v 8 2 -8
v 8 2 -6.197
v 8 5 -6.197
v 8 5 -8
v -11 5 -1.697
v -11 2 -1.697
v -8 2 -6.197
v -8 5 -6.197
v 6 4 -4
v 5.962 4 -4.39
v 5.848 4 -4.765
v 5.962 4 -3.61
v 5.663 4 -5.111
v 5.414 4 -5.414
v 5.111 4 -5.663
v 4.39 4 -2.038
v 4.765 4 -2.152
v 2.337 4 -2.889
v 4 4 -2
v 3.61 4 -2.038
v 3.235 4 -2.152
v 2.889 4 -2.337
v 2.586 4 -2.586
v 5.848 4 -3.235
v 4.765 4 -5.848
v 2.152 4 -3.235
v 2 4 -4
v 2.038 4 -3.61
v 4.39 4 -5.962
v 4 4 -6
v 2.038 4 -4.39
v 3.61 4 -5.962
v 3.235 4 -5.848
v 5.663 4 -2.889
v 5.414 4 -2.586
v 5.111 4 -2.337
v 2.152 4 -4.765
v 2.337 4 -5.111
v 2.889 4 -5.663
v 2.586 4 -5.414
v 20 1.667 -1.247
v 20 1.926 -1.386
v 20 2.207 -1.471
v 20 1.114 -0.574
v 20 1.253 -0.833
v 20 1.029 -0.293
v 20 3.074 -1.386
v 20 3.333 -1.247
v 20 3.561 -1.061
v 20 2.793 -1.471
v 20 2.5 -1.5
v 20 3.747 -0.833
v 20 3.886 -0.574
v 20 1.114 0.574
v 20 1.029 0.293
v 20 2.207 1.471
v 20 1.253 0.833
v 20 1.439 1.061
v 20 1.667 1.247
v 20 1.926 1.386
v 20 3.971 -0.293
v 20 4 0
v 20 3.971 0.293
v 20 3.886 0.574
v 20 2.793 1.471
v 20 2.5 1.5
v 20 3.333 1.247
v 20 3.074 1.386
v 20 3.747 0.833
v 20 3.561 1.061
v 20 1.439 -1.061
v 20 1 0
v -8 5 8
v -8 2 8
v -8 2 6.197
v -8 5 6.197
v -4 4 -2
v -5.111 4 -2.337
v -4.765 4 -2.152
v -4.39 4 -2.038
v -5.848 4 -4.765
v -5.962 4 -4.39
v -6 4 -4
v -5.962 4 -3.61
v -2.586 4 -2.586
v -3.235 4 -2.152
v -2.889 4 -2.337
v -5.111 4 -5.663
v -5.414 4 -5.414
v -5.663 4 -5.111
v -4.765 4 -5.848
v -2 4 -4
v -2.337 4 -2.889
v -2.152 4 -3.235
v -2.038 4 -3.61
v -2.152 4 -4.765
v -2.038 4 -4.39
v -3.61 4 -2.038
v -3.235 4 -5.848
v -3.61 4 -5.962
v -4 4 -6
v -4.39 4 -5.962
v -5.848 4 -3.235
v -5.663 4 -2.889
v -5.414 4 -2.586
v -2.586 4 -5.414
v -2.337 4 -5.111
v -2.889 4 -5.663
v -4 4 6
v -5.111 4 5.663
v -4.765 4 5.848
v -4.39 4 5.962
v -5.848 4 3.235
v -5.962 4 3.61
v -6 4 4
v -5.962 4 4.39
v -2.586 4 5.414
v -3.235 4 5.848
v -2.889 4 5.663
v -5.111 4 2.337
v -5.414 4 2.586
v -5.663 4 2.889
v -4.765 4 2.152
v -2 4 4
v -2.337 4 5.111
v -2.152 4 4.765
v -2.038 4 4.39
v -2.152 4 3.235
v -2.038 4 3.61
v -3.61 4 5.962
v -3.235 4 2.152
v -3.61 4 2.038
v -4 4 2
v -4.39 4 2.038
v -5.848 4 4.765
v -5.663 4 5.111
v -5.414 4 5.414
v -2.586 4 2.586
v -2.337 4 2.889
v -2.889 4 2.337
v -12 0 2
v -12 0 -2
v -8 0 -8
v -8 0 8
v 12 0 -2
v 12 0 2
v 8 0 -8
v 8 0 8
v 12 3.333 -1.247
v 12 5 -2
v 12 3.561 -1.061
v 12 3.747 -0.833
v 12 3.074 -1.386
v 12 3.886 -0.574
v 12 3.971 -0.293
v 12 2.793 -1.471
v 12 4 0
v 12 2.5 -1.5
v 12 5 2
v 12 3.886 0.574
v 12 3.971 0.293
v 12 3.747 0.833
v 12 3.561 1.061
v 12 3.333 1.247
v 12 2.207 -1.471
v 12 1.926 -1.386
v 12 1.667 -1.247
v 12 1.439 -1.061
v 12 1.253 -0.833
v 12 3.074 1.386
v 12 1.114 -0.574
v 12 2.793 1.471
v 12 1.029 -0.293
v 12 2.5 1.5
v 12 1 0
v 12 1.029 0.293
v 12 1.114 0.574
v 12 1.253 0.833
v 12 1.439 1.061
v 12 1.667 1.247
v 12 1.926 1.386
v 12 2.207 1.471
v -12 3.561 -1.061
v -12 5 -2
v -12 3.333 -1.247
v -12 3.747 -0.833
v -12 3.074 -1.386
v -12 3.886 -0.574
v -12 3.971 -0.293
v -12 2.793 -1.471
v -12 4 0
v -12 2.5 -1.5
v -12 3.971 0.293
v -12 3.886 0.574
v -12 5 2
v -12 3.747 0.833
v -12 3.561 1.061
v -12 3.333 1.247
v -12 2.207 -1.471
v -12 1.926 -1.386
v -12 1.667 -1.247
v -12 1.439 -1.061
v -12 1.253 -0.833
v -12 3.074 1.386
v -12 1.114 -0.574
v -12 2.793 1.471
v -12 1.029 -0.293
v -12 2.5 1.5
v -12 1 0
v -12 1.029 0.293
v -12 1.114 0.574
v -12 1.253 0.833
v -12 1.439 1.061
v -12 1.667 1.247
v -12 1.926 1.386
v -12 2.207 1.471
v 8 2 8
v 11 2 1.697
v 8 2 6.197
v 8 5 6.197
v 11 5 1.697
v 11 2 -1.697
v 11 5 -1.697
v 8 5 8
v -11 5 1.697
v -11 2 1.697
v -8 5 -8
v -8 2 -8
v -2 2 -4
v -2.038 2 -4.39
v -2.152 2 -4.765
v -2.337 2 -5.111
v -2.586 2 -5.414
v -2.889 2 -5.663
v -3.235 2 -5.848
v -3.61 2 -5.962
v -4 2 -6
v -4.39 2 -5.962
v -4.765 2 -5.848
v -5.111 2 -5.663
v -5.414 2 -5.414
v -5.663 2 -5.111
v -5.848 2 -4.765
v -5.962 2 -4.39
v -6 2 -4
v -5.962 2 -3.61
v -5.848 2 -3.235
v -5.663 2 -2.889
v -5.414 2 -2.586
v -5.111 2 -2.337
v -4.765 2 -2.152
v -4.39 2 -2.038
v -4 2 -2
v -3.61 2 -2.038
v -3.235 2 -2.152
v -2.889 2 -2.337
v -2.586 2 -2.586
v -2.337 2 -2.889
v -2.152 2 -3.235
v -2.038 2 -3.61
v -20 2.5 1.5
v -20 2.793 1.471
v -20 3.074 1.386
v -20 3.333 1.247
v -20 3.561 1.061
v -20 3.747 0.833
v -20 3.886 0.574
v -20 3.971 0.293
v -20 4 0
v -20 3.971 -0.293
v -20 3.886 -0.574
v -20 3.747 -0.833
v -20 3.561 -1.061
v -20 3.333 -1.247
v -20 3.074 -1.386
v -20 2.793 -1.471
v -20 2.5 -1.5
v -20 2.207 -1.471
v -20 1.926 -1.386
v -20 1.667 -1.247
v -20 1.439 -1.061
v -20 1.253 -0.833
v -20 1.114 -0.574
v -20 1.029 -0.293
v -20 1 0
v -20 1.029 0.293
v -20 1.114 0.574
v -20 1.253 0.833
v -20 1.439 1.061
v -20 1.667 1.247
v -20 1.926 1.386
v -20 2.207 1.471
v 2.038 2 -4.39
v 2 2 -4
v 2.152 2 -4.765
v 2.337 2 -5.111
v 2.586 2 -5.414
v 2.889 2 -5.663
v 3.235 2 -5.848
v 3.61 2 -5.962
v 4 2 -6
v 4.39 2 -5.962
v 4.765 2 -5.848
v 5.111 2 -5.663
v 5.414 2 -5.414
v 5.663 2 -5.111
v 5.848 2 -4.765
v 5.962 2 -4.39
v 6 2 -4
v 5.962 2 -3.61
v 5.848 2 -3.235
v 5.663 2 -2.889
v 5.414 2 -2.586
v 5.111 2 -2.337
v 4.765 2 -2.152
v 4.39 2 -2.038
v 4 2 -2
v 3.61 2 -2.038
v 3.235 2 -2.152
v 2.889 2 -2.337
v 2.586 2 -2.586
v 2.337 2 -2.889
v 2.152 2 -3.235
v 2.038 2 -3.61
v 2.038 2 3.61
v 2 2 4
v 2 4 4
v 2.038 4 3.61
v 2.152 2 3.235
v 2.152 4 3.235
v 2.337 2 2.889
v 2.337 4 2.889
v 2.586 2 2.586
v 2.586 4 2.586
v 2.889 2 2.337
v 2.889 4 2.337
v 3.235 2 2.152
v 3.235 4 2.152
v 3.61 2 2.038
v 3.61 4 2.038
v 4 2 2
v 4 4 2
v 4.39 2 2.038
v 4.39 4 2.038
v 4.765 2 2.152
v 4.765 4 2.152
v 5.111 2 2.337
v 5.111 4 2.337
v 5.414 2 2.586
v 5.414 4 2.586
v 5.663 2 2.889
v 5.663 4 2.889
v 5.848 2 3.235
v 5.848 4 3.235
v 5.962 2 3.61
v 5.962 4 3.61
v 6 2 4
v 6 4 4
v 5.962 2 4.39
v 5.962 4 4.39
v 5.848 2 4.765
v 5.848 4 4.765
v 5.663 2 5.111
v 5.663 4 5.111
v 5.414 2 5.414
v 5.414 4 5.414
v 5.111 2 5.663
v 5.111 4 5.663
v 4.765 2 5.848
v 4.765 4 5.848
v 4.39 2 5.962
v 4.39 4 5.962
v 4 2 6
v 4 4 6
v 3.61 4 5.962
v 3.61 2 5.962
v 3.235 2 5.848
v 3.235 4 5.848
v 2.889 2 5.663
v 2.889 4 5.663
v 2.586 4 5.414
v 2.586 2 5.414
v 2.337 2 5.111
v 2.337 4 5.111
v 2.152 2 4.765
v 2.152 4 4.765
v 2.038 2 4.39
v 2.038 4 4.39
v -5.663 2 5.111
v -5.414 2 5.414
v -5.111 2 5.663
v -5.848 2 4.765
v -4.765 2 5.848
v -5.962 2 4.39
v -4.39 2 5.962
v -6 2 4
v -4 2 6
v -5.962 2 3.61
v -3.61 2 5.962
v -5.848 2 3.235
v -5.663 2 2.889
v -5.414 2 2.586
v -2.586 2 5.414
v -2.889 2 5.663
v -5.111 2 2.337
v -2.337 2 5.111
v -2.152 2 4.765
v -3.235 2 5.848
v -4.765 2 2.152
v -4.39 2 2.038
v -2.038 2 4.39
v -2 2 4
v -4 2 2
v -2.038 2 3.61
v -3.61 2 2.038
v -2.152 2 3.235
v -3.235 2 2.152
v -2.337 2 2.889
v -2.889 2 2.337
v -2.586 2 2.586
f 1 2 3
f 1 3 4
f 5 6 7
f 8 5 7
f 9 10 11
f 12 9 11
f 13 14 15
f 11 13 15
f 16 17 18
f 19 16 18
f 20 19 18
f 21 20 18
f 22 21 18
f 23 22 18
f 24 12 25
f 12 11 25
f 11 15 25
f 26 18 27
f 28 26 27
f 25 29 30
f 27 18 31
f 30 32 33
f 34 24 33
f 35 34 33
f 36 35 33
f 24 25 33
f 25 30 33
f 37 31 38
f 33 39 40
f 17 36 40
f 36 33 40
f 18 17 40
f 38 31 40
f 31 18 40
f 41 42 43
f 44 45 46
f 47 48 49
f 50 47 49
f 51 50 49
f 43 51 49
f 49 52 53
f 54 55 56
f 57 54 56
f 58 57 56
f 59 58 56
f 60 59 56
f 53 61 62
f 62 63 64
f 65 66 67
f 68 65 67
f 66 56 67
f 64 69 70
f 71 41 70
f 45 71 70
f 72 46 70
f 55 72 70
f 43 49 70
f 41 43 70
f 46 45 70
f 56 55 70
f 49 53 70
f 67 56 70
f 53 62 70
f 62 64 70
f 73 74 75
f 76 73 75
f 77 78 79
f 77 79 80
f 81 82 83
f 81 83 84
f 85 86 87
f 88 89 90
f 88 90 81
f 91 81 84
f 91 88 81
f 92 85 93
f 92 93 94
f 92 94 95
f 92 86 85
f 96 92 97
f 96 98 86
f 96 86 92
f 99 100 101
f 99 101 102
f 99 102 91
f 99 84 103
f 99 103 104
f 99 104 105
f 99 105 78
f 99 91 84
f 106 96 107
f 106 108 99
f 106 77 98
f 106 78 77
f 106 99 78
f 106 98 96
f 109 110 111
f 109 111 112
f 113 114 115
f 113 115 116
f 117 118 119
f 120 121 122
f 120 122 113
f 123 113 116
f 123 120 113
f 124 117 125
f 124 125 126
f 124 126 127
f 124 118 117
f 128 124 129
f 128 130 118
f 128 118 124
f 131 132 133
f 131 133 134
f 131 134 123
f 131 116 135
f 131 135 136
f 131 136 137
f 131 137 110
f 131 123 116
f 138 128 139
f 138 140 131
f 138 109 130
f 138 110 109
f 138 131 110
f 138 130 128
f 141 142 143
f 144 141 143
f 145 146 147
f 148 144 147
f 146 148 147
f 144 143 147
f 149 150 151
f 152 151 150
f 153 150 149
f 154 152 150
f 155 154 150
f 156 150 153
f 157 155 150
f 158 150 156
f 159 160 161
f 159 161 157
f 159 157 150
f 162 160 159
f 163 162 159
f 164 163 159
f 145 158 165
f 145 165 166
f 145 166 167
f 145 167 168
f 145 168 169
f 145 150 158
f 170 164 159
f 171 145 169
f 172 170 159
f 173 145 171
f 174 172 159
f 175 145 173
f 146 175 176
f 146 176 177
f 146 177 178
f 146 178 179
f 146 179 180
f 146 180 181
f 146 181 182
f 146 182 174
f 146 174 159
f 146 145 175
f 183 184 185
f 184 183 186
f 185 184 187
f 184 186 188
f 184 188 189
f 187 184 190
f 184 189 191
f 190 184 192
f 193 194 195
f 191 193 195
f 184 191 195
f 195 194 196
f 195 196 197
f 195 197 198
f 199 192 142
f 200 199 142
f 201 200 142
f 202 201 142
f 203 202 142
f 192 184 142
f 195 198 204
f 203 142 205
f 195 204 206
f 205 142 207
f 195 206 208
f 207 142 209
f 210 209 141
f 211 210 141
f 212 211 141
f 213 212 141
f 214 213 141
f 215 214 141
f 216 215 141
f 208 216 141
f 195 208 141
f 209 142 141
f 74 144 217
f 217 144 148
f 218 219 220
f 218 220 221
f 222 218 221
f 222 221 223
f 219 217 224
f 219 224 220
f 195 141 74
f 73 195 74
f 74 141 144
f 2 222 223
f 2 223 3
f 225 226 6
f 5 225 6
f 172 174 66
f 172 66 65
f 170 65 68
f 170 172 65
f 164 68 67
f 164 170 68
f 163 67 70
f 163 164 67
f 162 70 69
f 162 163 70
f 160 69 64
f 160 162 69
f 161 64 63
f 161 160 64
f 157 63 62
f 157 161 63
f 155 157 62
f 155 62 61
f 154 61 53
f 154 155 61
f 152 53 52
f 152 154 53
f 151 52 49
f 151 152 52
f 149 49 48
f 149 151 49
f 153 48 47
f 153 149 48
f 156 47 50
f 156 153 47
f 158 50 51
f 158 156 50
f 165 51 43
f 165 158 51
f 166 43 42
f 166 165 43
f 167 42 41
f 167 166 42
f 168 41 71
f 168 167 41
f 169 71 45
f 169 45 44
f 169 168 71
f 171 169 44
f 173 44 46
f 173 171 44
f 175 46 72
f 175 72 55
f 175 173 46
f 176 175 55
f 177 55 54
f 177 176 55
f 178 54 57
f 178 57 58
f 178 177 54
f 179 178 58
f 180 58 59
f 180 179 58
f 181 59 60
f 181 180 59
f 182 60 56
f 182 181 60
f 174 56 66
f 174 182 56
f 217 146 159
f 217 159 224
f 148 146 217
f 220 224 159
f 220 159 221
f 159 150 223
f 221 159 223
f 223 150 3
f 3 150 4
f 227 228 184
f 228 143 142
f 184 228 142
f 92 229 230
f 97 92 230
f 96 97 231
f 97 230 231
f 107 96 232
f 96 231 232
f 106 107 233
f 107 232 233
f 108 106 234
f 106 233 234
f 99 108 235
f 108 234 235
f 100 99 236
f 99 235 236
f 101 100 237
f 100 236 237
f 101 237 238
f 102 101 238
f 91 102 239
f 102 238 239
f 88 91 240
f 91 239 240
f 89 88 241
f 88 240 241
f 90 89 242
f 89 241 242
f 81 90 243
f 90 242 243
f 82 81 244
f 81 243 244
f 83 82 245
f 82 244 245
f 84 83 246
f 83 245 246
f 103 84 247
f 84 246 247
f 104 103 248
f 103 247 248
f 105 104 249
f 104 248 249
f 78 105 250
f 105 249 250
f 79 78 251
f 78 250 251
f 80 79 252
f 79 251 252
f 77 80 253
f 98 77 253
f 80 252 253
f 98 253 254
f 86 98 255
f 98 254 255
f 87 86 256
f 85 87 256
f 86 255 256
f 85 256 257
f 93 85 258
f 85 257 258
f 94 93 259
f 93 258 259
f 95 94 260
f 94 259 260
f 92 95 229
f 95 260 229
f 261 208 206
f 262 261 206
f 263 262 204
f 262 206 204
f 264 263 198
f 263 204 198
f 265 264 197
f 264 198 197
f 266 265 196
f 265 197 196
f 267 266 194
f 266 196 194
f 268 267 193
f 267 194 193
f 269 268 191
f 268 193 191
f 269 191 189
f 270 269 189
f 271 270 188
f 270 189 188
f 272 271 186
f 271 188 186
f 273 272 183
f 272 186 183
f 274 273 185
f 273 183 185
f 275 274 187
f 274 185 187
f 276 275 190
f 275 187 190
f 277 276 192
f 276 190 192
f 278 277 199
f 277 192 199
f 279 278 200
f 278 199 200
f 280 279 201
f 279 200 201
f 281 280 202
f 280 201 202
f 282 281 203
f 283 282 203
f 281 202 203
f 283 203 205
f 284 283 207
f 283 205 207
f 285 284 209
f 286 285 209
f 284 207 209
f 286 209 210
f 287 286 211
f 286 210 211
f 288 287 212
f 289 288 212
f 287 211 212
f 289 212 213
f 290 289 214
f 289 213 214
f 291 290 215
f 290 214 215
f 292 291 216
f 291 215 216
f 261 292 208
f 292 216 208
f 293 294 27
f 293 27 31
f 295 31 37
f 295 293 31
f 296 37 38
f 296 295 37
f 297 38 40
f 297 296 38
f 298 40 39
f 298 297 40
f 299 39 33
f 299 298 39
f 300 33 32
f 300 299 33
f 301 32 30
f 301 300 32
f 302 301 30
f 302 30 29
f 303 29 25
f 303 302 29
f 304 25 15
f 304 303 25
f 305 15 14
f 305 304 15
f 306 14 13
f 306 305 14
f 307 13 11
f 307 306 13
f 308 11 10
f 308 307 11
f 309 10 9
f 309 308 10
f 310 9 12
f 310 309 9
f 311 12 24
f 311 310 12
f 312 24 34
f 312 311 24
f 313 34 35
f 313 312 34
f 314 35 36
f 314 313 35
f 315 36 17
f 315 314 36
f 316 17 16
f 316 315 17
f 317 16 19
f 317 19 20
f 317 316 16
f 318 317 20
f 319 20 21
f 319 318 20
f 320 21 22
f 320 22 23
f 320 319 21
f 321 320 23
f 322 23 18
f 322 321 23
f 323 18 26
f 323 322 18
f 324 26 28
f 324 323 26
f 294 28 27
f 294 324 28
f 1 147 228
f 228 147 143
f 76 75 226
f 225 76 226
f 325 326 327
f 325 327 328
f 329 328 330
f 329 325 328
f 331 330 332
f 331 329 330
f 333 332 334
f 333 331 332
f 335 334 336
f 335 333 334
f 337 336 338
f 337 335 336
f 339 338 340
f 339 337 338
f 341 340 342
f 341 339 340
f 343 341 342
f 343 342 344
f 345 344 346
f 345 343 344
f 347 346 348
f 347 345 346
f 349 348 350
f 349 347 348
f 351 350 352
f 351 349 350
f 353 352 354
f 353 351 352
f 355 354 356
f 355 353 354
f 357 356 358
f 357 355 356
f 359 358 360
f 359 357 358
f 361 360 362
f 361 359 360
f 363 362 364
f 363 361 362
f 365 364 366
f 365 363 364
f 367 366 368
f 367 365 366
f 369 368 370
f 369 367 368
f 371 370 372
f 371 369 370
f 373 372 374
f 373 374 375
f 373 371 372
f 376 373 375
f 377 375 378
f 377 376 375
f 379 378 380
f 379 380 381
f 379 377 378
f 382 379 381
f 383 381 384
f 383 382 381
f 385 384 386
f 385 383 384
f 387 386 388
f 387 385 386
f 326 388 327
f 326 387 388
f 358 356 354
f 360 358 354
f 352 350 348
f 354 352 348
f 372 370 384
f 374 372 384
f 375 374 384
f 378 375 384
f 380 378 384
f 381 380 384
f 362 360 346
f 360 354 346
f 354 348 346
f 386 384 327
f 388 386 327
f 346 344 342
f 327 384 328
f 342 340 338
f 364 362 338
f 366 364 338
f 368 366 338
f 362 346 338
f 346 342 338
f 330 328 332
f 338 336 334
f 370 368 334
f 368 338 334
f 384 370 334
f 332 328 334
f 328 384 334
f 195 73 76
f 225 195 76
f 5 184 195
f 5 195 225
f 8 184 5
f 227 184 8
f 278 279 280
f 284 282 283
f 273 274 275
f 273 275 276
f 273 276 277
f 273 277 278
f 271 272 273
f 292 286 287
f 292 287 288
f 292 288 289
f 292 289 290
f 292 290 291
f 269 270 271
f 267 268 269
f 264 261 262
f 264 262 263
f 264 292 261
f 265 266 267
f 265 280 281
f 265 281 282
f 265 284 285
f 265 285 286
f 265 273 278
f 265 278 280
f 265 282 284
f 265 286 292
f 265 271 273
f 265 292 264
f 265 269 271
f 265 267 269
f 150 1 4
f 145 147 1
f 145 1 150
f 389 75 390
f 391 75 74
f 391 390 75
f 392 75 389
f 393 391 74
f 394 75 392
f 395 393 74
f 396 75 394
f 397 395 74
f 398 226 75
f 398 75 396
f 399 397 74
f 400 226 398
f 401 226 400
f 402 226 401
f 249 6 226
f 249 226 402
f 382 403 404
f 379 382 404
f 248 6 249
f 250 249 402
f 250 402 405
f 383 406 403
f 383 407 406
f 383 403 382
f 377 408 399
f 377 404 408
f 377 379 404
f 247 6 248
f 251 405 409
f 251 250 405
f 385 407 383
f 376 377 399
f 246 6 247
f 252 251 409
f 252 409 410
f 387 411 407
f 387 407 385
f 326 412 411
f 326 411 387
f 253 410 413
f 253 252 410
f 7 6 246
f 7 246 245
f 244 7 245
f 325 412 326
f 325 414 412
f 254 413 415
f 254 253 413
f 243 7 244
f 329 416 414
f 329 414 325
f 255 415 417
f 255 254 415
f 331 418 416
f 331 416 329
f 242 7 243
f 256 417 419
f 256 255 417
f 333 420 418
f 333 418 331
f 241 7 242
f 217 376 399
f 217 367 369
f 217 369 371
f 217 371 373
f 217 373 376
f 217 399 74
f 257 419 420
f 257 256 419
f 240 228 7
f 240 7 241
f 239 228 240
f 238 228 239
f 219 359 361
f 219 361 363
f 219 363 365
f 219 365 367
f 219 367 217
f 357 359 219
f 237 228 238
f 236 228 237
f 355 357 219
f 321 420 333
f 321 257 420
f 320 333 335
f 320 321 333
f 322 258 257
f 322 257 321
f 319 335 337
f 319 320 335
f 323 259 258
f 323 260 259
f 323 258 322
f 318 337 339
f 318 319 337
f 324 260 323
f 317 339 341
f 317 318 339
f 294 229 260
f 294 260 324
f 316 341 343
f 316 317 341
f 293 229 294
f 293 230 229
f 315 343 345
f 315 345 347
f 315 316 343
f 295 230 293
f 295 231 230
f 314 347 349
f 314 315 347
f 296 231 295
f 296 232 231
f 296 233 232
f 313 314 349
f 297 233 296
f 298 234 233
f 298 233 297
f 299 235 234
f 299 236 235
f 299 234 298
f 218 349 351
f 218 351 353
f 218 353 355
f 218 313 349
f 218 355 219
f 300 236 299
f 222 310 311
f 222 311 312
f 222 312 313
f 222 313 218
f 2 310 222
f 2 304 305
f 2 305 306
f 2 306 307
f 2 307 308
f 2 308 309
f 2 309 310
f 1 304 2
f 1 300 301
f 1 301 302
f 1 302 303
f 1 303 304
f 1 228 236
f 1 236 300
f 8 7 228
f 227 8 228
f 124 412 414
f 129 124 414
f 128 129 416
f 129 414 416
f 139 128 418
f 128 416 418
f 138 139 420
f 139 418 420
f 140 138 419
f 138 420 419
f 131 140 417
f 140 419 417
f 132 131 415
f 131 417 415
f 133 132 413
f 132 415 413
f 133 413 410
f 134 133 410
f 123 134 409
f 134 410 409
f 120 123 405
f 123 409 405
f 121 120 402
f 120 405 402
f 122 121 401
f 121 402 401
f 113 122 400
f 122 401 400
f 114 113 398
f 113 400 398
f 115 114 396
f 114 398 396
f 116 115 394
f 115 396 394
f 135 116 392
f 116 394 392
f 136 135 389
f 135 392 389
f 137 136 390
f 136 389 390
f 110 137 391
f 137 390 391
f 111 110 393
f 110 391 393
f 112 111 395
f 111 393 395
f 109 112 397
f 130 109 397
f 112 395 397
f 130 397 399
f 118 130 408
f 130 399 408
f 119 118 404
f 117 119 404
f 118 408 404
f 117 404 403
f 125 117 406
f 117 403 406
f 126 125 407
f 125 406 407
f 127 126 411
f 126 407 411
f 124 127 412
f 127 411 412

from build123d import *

# Parameters (mm, degrees)
BOSS_EXTRUDE1_DEPTH = 2
SKETCH2_R           = 2
BOSS_EXTRUDE2_DEPTH = 2
BOSS_EXTRUDE3_DEPTH = 3
SKETCH4_R           = 1.5
BOSS_EXTRUDE4_DEPTH = 8


with BuildPart() as part:
    # Sketch1 → Boss-Extrude1 (new body)
    with BuildSketch(Plane(origin=(0, 0, 0), x_dir=(1, 0, 0), z_dir=(0, 1, 0))):
        Polygon((-12, -2), (-12, 2), (-8, 8), (0, 8), (0, -8), (-8, -8), align=None)
    extrude(amount=BOSS_EXTRUDE1_DEPTH)

    # Sketch2 → Boss-Extrude2 (add)
    with BuildSketch(Plane(origin=(0, 2, 0), x_dir=(1, 0, 0), z_dir=(0, 1, 0))):
        with Locations((-4, 4)):
            Circle(SKETCH2_R)
        with Locations((-4, -4)):
            Circle(SKETCH2_R)
    extrude(amount=BOSS_EXTRUDE2_DEPTH)

    # Sketch3 → Boss-Extrude3 (add)
    with BuildSketch(Plane(origin=(0, 2, 0), x_dir=(1, 0, 0), z_dir=(0, 1, 0))):
        Polygon((-12, -2), (-8, -8), (-8, -6.197224362), (-11, -1.697224362), (-11, 1.697224362), (-8, 6.197224362), (-8, 8), (-12, 2), align=None)
    extrude(amount=BOSS_EXTRUDE3_DEPTH)

    # Sketch4 → Boss-Extrude4 (add)
    with BuildSketch(Plane.ZY.offset(12)):
        with Locations((0, 2.5)):
            Circle(SKETCH4_R)
    extrude(amount=BOSS_EXTRUDE4_DEPTH)

    # Mirror2: part across plane


with BuildPart() as part_1:
    add(part.part)
    add(part.part.mirror(Plane(origin=(0, 0, 0), x_dir=(0, 0, 1), z_dir=(1, 0, 0))))


solid = part_1.part
